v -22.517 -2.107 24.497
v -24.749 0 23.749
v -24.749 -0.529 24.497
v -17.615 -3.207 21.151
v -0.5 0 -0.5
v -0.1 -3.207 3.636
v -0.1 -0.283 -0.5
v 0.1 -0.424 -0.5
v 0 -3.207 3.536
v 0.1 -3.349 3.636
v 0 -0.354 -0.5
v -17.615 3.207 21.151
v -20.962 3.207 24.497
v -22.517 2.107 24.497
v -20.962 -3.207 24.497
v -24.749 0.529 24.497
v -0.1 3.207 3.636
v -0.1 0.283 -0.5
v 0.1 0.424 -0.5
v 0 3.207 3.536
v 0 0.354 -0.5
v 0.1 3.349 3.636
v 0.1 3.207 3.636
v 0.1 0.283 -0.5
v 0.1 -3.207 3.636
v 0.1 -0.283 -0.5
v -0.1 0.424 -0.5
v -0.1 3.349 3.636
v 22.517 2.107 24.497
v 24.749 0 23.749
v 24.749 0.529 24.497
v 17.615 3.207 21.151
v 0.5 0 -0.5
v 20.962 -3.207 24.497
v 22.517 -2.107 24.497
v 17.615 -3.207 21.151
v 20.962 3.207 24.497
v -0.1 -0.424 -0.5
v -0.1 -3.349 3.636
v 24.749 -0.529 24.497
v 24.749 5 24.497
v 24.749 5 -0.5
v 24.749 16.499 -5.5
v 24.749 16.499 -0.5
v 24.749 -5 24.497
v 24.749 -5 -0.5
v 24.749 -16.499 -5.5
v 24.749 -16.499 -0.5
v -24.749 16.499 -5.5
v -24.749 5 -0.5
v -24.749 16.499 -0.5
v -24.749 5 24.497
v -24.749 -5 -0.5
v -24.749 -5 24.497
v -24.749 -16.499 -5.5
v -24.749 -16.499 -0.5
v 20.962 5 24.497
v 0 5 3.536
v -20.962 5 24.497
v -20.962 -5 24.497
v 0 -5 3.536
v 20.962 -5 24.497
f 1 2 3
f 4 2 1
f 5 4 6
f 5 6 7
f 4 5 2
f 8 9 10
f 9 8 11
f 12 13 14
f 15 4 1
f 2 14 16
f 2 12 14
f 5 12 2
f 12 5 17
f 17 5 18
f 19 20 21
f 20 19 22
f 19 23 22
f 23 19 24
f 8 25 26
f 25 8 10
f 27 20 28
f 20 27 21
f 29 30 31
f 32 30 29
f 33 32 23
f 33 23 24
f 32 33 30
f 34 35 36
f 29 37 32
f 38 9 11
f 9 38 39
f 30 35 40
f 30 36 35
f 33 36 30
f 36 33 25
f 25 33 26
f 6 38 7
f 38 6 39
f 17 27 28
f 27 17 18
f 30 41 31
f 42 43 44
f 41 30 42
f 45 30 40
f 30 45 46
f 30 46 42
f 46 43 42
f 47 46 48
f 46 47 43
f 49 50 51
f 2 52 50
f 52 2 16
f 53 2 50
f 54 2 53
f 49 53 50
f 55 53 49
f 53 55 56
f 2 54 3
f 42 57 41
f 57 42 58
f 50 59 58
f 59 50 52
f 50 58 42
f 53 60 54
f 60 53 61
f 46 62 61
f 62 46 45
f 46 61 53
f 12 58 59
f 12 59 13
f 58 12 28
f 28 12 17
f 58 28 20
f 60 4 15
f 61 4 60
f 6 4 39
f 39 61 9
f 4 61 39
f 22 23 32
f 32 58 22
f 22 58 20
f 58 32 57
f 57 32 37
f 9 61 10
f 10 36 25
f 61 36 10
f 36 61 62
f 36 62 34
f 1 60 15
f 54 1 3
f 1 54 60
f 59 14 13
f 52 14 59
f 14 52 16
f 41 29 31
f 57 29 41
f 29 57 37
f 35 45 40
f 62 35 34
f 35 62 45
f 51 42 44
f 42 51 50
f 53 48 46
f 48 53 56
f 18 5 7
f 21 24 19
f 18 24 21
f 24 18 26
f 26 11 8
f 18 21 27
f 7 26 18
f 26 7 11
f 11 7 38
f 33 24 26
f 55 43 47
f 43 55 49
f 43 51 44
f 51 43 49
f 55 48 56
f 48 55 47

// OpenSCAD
union () {
  difference () {
    translate ([0, 0, 20]) {
      cube ([49.49747468305833, 10, 49.49747468305833], center=true);
    }
    translate ([0, 0, 14.142135623730951]) {
      rotate (a=90.0, v=[1, 0, 0]) {
        rotate (a=45.0, v=[0, 0, 1]) {
          translate ([10, 10, 0]) {
            cube ([35.0, 35.0, 11.0], center=true);
          }
        }
      }
    }
    translate ([0, 0, 49.49747468305833]) {
      cube ([100, 100, 50], center=true);
    }
    difference () {
      translate ([-10.0, 0, 21]) {
        rotate (a=45.0, v=[0, 1, 0]) {
          rotate (a=45.0, v=[1, 0, 0]) {
            cube ([45, 12, 12], center=true);
          }
        }
      }
      translate ([50.1, 0, 0]) {
        cube ([100, 100, 100], center=true);
      }
    }
    rotate (a=180.0, v=[0, 0, 1]) {
      difference () {
        translate ([-10.0, 0, 21]) {
          rotate (a=45.0, v=[0, 1, 0]) {
            rotate (a=45.0, v=[1, 0, 0]) {
              cube ([45, 12, 12], center=true);
            }
          }
        }
        translate ([50.1, 0, 0]) {
          cube ([100, 100, 100], center=true);
        }
      }
    }
  }
  translate ([0, 0, -3]) {
    cube ([49.49747468305833, 32.99831645537222, 5], center=true);
  }
}
